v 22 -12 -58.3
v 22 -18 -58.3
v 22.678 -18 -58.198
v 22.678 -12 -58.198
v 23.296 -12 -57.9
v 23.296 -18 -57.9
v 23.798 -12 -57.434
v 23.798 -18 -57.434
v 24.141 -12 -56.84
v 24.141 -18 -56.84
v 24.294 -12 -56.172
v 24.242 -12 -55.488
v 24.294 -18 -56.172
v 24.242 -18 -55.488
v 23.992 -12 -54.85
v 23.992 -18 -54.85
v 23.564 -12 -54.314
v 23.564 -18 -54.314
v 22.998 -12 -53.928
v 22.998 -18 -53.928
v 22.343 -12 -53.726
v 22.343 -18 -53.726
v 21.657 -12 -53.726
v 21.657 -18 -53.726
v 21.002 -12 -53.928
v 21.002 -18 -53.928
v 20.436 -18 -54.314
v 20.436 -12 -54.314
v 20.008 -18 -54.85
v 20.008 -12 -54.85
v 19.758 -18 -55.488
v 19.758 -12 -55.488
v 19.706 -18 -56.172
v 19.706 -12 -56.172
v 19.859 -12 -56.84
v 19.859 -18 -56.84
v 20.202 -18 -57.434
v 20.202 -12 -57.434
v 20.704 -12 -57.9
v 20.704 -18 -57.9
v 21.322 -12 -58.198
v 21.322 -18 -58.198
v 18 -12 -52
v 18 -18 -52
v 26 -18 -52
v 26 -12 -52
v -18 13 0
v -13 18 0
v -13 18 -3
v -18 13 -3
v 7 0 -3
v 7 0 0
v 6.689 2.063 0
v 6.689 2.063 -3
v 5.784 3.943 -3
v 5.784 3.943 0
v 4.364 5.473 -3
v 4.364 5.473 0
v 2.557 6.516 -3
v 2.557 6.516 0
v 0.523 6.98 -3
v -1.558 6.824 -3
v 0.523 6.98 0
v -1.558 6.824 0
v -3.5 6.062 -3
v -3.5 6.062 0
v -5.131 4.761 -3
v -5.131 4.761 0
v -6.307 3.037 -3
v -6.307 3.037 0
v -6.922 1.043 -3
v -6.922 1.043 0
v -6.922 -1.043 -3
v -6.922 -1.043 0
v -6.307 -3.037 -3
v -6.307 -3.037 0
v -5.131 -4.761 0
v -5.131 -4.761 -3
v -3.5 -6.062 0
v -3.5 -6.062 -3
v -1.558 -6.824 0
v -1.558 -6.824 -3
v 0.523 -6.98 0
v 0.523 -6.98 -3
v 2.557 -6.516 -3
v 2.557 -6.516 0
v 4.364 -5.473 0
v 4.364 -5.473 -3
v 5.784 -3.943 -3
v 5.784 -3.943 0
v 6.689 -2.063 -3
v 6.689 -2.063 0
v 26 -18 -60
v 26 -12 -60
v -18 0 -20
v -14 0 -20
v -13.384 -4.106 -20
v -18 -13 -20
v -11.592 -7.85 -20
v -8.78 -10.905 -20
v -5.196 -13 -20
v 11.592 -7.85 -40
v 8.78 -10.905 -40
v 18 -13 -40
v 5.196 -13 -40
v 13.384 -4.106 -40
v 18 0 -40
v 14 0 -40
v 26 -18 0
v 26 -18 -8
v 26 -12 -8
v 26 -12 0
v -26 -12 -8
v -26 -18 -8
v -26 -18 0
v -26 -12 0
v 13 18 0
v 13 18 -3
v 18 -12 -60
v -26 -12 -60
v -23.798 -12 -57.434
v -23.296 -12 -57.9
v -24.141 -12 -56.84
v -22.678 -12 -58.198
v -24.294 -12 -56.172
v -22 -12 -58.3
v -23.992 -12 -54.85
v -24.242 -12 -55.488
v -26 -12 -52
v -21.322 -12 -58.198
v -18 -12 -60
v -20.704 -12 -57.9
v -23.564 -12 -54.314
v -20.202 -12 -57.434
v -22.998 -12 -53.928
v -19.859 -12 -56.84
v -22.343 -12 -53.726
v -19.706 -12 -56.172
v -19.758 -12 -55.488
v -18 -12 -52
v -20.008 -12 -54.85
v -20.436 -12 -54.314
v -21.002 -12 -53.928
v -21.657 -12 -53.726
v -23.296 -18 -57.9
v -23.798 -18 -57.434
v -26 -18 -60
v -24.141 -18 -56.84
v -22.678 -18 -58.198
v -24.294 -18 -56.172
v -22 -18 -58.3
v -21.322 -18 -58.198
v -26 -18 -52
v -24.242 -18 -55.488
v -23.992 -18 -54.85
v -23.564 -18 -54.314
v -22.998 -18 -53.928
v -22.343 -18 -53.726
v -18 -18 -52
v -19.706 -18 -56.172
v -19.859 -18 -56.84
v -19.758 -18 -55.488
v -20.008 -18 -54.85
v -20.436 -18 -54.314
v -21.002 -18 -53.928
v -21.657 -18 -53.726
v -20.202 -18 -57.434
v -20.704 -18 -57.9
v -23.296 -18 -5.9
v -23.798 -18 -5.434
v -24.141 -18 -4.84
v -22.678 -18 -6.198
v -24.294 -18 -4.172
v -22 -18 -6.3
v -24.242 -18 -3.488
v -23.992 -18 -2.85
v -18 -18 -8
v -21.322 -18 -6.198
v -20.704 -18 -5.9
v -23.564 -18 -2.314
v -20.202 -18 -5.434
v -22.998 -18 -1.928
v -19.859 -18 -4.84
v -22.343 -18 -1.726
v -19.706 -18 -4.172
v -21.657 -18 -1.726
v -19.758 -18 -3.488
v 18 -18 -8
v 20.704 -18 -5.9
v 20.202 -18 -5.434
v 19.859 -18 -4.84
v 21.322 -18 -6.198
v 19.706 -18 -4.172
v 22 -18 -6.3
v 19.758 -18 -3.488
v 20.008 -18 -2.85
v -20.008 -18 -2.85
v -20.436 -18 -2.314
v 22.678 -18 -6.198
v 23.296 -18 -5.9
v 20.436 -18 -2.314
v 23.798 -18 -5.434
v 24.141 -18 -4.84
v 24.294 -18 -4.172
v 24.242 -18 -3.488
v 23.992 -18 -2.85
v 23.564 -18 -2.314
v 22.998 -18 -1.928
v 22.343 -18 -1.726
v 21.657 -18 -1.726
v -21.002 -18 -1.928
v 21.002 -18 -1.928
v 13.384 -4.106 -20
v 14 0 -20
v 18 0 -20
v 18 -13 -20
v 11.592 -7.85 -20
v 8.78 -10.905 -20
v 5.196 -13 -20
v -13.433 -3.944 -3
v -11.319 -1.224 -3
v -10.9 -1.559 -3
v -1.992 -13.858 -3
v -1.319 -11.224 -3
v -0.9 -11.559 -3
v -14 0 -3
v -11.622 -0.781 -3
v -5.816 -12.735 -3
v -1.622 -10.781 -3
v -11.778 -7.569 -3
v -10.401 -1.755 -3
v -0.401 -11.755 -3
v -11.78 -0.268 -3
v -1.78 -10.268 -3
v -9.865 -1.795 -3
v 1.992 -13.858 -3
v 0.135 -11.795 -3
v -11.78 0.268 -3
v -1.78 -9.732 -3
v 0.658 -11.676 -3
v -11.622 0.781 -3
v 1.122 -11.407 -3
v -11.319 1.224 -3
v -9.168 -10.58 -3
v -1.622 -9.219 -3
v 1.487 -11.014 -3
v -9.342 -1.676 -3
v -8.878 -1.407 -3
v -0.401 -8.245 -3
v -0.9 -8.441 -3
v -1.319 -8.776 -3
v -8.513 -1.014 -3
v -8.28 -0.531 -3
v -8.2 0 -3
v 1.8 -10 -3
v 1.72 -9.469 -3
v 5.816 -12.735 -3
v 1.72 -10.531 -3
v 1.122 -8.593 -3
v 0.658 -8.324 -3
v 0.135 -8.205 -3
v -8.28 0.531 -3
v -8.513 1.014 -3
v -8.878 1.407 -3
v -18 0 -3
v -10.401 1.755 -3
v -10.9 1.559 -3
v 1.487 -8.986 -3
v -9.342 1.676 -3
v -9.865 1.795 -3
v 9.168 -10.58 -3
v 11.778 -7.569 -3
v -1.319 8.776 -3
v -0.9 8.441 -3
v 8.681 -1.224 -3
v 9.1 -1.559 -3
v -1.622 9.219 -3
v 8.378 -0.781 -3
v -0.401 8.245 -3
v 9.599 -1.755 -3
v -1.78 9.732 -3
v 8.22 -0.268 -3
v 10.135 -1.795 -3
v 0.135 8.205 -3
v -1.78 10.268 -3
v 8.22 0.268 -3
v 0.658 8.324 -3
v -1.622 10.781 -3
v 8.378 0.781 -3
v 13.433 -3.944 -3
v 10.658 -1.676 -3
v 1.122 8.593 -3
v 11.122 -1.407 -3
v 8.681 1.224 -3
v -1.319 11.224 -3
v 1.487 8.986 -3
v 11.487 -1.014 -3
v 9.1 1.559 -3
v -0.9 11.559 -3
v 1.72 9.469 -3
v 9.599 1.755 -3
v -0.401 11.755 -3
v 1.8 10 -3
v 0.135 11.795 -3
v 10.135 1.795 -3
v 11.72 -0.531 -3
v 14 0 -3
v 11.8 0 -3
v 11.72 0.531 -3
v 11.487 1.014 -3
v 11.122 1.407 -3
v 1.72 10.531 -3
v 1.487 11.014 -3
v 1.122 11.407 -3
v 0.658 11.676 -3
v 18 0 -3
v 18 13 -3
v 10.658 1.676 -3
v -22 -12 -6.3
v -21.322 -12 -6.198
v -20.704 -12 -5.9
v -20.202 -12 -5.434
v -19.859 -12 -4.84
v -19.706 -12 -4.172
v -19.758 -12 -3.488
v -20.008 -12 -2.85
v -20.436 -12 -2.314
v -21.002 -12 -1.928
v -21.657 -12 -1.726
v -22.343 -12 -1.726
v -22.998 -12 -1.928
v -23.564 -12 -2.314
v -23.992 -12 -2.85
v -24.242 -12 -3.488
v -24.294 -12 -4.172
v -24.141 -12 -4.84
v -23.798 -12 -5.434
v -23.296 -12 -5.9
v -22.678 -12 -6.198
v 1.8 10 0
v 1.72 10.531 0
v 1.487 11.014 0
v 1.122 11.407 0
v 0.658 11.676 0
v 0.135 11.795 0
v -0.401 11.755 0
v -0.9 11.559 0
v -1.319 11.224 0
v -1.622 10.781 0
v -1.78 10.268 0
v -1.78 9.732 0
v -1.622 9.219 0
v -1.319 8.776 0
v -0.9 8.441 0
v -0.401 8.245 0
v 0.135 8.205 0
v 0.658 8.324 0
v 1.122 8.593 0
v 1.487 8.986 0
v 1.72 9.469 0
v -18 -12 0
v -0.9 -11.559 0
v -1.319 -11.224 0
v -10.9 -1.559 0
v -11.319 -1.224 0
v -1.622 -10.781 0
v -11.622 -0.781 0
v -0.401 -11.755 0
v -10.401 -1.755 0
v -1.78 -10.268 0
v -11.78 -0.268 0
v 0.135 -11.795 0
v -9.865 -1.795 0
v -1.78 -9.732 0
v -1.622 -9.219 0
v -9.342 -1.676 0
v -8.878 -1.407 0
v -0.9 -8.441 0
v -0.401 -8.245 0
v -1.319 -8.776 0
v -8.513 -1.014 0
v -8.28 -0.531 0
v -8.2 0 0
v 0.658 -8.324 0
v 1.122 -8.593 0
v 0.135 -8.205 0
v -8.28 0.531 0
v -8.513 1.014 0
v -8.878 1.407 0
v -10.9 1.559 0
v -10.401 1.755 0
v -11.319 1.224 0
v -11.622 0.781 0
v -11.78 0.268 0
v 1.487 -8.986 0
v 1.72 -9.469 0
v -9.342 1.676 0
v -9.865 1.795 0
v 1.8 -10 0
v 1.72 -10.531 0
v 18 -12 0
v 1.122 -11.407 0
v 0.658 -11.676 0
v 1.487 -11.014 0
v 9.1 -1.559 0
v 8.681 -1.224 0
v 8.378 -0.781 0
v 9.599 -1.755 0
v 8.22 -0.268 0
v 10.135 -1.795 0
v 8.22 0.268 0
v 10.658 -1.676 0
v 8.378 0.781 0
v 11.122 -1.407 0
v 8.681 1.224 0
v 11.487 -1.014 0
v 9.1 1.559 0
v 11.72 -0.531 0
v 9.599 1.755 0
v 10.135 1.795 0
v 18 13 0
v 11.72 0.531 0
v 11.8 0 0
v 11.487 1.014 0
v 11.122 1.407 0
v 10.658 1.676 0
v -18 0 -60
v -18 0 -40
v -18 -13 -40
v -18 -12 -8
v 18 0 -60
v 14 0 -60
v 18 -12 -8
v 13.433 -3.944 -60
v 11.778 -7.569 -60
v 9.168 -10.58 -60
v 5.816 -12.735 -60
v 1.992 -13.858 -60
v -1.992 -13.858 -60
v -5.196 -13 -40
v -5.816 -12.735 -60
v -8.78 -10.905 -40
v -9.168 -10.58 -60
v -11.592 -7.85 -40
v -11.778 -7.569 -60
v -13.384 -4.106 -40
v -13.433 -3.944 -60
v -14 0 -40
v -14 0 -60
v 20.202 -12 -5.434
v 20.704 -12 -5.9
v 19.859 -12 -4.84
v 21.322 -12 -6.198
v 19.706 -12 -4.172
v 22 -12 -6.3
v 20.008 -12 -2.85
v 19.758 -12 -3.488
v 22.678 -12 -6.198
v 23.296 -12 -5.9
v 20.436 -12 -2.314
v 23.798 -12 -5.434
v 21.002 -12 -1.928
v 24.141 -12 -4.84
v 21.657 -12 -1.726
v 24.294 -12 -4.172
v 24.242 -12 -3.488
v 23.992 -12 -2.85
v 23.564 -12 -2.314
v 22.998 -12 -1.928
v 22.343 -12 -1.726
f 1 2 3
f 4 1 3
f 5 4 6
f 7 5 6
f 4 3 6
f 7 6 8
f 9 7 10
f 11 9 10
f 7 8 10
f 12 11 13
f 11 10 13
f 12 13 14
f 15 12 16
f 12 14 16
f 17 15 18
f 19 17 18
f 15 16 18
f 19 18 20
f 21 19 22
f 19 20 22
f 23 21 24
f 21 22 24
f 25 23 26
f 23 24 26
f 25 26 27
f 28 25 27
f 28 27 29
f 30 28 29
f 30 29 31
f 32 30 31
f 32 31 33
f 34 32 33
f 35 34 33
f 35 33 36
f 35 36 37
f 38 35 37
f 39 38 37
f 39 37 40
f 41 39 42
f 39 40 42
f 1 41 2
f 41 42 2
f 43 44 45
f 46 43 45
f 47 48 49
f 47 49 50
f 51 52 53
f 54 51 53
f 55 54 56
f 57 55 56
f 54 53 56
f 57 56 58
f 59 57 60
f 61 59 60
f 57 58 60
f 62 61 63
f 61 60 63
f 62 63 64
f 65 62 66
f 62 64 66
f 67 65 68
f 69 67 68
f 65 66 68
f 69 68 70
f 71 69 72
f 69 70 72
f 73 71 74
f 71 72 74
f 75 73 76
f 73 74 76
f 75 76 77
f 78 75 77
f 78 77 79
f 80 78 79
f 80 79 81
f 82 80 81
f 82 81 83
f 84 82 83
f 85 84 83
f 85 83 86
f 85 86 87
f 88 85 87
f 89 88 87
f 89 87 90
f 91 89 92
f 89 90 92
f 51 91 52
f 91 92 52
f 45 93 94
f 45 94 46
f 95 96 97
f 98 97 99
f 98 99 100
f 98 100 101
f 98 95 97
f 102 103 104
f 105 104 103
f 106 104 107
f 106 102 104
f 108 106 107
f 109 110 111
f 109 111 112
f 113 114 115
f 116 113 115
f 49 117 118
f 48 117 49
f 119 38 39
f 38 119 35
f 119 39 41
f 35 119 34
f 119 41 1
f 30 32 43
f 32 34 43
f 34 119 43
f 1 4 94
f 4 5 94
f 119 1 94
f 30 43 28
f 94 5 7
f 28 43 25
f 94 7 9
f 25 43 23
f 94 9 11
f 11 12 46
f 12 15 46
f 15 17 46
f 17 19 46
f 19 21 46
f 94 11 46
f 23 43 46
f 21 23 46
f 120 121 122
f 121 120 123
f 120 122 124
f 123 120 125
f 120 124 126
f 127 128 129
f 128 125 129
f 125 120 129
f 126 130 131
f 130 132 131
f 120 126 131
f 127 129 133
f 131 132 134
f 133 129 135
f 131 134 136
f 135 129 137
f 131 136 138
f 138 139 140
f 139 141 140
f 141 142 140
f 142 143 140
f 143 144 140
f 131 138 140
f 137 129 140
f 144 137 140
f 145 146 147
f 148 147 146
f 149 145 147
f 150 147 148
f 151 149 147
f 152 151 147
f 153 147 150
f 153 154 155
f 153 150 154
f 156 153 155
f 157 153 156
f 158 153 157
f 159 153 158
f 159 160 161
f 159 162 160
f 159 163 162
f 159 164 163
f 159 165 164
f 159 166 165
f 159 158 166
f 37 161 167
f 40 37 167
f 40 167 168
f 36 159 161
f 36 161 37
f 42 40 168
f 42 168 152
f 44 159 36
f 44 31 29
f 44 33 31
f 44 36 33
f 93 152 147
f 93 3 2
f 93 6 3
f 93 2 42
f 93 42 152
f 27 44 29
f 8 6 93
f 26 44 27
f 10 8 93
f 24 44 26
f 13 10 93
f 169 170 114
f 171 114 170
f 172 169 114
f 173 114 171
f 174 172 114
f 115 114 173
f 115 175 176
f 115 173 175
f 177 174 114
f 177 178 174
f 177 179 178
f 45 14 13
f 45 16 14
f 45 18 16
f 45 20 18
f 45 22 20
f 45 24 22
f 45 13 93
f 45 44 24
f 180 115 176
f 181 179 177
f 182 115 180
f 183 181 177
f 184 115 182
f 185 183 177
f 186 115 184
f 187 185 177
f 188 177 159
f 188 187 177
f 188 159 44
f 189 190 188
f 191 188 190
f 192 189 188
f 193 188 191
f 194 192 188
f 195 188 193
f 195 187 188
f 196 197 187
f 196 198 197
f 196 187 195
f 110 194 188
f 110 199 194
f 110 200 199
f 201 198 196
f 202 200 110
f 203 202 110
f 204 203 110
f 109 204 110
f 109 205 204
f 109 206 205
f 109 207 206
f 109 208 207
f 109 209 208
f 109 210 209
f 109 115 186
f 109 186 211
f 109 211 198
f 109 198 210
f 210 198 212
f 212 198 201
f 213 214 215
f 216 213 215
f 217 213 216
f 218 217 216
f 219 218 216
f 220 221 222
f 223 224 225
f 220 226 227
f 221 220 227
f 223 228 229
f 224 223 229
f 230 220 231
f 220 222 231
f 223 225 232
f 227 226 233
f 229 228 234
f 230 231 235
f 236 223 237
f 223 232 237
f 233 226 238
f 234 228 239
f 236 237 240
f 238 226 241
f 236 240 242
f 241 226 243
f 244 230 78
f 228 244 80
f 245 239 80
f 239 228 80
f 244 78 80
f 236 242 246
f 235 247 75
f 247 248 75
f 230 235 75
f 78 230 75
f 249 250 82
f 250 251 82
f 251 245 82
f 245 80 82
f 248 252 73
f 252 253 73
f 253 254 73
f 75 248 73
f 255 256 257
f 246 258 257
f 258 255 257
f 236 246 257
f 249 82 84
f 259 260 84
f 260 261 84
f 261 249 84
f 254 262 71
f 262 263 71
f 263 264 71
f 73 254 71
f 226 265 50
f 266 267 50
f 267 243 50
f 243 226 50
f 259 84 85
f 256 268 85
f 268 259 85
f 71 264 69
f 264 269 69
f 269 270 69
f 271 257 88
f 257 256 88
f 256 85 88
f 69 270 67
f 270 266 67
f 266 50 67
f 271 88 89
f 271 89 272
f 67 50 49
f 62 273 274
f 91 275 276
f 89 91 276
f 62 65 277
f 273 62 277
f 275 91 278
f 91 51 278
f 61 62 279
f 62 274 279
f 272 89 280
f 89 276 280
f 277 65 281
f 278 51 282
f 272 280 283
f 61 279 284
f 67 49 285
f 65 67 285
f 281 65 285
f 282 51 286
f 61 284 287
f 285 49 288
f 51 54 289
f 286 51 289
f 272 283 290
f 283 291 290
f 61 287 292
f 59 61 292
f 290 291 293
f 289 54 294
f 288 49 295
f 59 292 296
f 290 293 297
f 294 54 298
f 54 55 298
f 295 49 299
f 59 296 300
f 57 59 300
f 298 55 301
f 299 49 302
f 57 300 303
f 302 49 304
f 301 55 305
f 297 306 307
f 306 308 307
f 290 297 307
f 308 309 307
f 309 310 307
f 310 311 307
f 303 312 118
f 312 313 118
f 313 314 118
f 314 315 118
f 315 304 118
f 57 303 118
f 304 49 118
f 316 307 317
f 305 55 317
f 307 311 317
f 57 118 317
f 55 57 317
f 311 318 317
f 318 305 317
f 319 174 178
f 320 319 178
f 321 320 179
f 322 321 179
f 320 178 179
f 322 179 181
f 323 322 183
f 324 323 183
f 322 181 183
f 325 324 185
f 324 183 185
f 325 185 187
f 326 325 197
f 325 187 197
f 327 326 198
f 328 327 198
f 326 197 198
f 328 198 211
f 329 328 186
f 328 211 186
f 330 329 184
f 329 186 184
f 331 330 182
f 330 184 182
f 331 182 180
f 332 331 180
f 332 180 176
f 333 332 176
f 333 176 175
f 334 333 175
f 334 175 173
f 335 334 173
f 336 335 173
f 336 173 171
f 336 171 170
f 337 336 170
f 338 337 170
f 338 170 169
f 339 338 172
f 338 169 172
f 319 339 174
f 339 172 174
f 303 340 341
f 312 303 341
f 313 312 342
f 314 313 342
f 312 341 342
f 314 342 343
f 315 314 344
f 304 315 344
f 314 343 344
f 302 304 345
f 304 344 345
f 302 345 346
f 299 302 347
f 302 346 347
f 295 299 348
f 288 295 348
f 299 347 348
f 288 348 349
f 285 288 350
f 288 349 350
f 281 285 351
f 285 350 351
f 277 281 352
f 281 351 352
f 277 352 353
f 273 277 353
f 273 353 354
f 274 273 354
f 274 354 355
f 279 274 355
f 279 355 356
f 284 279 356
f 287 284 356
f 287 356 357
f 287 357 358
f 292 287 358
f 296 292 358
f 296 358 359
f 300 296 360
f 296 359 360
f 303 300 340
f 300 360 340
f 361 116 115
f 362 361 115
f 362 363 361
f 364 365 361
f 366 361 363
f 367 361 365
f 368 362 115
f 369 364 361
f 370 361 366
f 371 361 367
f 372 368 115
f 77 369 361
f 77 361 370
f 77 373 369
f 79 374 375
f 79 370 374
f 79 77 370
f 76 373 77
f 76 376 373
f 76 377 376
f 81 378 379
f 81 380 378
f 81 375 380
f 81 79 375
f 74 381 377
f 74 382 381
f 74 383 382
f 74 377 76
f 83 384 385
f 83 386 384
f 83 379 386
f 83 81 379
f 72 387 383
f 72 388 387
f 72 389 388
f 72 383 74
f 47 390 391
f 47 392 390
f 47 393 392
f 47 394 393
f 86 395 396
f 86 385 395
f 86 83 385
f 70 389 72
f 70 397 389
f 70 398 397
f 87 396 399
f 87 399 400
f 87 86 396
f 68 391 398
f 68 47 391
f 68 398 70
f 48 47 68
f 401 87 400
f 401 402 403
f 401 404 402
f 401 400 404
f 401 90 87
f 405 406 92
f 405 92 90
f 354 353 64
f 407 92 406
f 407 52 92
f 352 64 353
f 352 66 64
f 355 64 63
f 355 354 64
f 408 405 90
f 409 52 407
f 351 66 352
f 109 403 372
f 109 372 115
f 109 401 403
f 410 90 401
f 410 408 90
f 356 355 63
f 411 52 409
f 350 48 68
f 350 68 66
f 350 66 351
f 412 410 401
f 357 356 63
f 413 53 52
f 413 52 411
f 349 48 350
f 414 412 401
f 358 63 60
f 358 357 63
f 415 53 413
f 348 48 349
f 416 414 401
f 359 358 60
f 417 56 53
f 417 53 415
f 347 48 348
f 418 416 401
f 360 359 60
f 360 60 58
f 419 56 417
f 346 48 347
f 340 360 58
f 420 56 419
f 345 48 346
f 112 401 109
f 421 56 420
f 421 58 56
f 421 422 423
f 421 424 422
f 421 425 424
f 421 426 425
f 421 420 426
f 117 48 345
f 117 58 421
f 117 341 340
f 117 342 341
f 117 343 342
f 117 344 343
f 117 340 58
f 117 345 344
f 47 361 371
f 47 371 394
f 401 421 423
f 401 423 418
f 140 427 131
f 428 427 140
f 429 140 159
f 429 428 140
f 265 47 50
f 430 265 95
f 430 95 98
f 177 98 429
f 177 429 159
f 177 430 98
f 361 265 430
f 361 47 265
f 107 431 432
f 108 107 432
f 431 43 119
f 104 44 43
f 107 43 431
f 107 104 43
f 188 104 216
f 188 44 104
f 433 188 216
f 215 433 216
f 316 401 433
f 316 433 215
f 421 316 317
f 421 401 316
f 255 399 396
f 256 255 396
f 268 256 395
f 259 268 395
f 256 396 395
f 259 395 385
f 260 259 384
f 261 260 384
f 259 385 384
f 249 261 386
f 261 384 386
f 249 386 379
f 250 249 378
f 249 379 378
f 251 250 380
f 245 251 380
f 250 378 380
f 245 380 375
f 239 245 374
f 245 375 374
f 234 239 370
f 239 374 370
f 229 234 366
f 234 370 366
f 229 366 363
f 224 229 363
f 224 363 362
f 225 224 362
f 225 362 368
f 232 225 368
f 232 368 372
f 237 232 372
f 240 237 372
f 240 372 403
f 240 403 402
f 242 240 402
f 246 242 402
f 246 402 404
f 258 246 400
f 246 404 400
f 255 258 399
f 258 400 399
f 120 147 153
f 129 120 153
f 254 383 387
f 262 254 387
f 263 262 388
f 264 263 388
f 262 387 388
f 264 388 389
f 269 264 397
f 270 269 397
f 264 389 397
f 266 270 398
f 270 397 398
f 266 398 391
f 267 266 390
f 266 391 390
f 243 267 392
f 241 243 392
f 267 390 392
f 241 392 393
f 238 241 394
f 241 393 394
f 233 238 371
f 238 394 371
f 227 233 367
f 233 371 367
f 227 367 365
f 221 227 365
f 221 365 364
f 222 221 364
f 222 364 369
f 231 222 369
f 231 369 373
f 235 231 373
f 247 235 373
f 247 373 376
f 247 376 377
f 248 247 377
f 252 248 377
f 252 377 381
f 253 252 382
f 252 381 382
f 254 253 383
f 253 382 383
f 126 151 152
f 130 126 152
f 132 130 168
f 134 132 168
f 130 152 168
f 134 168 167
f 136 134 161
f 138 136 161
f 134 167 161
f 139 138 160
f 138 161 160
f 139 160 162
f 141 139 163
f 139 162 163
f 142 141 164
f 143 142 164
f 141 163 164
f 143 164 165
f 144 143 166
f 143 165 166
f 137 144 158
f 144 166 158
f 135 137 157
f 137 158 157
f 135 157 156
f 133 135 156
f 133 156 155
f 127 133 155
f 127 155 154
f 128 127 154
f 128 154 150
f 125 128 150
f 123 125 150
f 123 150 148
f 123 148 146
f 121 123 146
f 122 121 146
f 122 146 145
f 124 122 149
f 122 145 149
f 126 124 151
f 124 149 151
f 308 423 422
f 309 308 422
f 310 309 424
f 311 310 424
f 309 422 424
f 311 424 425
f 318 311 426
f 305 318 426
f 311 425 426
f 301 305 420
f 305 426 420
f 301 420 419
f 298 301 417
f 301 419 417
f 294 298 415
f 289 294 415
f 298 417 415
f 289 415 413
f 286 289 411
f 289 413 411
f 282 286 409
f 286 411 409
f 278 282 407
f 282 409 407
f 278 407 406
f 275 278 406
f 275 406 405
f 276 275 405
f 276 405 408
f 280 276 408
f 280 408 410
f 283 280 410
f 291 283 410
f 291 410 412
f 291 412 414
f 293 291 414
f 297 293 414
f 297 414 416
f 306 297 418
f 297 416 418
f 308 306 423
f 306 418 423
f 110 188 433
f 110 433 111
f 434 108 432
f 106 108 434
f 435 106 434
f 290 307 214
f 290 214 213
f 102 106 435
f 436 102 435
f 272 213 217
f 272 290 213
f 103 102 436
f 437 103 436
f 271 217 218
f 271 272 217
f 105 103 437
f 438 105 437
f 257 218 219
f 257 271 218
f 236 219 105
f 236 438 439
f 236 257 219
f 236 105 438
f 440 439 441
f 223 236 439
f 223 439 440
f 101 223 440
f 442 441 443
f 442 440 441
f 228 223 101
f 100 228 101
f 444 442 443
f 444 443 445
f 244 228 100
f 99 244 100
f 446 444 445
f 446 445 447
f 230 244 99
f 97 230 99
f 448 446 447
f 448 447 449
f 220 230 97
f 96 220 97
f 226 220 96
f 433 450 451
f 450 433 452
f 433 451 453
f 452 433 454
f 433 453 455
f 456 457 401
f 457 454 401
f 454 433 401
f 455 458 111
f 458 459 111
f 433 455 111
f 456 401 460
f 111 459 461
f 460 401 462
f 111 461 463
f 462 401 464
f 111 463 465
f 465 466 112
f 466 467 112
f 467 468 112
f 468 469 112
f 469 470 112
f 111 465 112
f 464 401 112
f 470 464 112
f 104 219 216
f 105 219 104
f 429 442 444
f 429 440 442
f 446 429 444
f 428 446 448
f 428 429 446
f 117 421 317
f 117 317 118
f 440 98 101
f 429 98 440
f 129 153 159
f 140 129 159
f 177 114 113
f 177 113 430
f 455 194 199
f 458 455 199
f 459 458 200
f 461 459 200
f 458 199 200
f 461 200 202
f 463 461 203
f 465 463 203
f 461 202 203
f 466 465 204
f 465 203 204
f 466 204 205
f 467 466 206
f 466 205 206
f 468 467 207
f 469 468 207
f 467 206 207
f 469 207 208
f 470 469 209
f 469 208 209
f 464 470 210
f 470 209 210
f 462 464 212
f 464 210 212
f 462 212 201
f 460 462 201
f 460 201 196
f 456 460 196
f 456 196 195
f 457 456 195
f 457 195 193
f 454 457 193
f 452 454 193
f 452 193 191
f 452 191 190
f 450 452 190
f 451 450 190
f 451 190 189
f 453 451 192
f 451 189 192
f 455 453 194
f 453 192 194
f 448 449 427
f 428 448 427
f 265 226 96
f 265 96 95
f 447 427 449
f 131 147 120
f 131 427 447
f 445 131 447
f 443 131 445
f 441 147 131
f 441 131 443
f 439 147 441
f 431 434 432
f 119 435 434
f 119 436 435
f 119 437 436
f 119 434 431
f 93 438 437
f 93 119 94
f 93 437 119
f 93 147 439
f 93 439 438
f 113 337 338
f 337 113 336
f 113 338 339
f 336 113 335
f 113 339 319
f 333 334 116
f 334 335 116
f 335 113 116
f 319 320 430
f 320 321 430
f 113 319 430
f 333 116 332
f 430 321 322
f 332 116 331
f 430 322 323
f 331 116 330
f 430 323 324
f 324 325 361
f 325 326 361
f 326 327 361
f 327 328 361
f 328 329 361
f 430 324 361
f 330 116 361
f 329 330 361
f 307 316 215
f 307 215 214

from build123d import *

# Parameters (mm, degrees)
BOSS_EXTRU_1_DEPTH      = 60
ESQUISSE1_3_R           = 1.8
ESQUISSE1_3_R_2         = 7
BOSS_EXTRU_2_DEPTH      = 3
ENL_V_MAT_EXTRU_2_DEPTH = 50
ESQUISSE2_W             = 8
ESQUISSE2_H             = 8
ESQUISSE2_R             = 2.3
BOSS_EXTRU_4_DEPTH      = 6


with BuildPart() as part:
    # Esquisse1 → Boss.-Extru.1 (new body)
    with BuildSketch(Plane.XY):
        with BuildLine():
            ThreePointArc((18, 0), (12.727922061, -12.727922061), (0, -18))
            Line((0, -18), (18, -18))
            Line((18, -18), (18, 0))
        make_face()
        with BuildLine():
            ThreePointArc((0, -18), (-12.727922061, -12.727922061), (-18, 0))
            Line((-18, 0), (-18, -18))
            Line((-18, -18), (0, -18))
        make_face()
        with BuildLine():
            Line((-14, 0), (-18, 0))
            ThreePointArc((-18, 0), (-12.727922061, -12.727922061), (0, -18))
            ThreePointArc((0, -18), (12.727922061, -12.727922061), (18, 0))
            Line((18, 0), (14, 0))
            ThreePointArc((14, 0), (0, -14), (-14, 0))
        make_face()
    extrude(amount=-BOSS_EXTRU_1_DEPTH)

    # Esquisse1<3> → Boss.-Extru.2 (add)
    with BuildSketch(Plane.XY):
        with BuildLine():
            Line((-13, 18), (-18, 13))
            Line((-18, 13), (-18, 0))
            Line((-18, 0), (-14, 0))
            ThreePointArc((-14, 0), (0, -14), (14, 0))
            Line((14, 0), (18, 0))
            Line((18, 0), (18, 13))
            Line((18, 13), (13, 18))
            Line((13, 18), (-13, 18))
        make_face()
        with Locations((0, 10)):
            Circle(ESQUISSE1_3_R, mode=Mode.SUBTRACT)
        with Locations((0, -10)):
            Circle(ESQUISSE1_3_R, mode=Mode.SUBTRACT)
        with Locations((-10, 0)):
            Circle(ESQUISSE1_3_R, mode=Mode.SUBTRACT)
        Circle(ESQUISSE1_3_R_2, mode=Mode.SUBTRACT)
        with Locations((10, 0)):
            Circle(ESQUISSE1_3_R, mode=Mode.SUBTRACT)
    extrude(amount=-BOSS_EXTRU_2_DEPTH)

    # Esquisse3 → Enlèv. mat.-Extru.2 (cut)
    with BuildSketch(Plane.ZY.offset(18)):
        Polygon((-30, 0), (-20, 0), (-20, -13), (-40, -13), (-40, 0), align=None)
    extrude(amount=-ENL_V_MAT_EXTRU_2_DEPTH, mode=Mode.SUBTRACT)

    # Esquisse2 → Boss.-Extru.4 (add)
    # profile 1 of 4: a face of its own
    with BuildSketch(Plane.XZ.offset(18)):
        with Locations((22, -56)):
            Rectangle(ESQUISSE2_W, ESQUISSE2_H)
        with Locations(Location((22, -56, 0), (0, 0, 270))):
            Circle(ESQUISSE2_R, mode=Mode.SUBTRACT)
    # profile 2 of 4: a face of its own
    with BuildSketch(Plane.XZ.offset(18)):
        with Locations((-22, -56)):
            Rectangle(ESQUISSE2_W, ESQUISSE2_H)
        with Locations(Location((-22, -56, 0), (0, 0, 270))):
            Circle(ESQUISSE2_R, mode=Mode.SUBTRACT)
    # profile 3 of 4: a face of its own
    with BuildSketch(Plane.XZ.offset(18)):
        with Locations((-22, -4)):
            Rectangle(ESQUISSE2_W, ESQUISSE2_H)
        with Locations(Location((-22, -4, 0), (0, 0, 270))):
            Circle(ESQUISSE2_R, mode=Mode.SUBTRACT)
    # profile 4 of 4: a face of its own
    with BuildSketch(Plane.XZ.offset(18)):
        with Locations((22, -4)):
            Rectangle(ESQUISSE2_W, ESQUISSE2_H)
        with Locations(Location((22, -4, 0), (0, 0, 270))):
            Circle(ESQUISSE2_R, mode=Mode.SUBTRACT)
    extrude(amount=-BOSS_EXTRU_4_DEPTH)


solid = part.part
